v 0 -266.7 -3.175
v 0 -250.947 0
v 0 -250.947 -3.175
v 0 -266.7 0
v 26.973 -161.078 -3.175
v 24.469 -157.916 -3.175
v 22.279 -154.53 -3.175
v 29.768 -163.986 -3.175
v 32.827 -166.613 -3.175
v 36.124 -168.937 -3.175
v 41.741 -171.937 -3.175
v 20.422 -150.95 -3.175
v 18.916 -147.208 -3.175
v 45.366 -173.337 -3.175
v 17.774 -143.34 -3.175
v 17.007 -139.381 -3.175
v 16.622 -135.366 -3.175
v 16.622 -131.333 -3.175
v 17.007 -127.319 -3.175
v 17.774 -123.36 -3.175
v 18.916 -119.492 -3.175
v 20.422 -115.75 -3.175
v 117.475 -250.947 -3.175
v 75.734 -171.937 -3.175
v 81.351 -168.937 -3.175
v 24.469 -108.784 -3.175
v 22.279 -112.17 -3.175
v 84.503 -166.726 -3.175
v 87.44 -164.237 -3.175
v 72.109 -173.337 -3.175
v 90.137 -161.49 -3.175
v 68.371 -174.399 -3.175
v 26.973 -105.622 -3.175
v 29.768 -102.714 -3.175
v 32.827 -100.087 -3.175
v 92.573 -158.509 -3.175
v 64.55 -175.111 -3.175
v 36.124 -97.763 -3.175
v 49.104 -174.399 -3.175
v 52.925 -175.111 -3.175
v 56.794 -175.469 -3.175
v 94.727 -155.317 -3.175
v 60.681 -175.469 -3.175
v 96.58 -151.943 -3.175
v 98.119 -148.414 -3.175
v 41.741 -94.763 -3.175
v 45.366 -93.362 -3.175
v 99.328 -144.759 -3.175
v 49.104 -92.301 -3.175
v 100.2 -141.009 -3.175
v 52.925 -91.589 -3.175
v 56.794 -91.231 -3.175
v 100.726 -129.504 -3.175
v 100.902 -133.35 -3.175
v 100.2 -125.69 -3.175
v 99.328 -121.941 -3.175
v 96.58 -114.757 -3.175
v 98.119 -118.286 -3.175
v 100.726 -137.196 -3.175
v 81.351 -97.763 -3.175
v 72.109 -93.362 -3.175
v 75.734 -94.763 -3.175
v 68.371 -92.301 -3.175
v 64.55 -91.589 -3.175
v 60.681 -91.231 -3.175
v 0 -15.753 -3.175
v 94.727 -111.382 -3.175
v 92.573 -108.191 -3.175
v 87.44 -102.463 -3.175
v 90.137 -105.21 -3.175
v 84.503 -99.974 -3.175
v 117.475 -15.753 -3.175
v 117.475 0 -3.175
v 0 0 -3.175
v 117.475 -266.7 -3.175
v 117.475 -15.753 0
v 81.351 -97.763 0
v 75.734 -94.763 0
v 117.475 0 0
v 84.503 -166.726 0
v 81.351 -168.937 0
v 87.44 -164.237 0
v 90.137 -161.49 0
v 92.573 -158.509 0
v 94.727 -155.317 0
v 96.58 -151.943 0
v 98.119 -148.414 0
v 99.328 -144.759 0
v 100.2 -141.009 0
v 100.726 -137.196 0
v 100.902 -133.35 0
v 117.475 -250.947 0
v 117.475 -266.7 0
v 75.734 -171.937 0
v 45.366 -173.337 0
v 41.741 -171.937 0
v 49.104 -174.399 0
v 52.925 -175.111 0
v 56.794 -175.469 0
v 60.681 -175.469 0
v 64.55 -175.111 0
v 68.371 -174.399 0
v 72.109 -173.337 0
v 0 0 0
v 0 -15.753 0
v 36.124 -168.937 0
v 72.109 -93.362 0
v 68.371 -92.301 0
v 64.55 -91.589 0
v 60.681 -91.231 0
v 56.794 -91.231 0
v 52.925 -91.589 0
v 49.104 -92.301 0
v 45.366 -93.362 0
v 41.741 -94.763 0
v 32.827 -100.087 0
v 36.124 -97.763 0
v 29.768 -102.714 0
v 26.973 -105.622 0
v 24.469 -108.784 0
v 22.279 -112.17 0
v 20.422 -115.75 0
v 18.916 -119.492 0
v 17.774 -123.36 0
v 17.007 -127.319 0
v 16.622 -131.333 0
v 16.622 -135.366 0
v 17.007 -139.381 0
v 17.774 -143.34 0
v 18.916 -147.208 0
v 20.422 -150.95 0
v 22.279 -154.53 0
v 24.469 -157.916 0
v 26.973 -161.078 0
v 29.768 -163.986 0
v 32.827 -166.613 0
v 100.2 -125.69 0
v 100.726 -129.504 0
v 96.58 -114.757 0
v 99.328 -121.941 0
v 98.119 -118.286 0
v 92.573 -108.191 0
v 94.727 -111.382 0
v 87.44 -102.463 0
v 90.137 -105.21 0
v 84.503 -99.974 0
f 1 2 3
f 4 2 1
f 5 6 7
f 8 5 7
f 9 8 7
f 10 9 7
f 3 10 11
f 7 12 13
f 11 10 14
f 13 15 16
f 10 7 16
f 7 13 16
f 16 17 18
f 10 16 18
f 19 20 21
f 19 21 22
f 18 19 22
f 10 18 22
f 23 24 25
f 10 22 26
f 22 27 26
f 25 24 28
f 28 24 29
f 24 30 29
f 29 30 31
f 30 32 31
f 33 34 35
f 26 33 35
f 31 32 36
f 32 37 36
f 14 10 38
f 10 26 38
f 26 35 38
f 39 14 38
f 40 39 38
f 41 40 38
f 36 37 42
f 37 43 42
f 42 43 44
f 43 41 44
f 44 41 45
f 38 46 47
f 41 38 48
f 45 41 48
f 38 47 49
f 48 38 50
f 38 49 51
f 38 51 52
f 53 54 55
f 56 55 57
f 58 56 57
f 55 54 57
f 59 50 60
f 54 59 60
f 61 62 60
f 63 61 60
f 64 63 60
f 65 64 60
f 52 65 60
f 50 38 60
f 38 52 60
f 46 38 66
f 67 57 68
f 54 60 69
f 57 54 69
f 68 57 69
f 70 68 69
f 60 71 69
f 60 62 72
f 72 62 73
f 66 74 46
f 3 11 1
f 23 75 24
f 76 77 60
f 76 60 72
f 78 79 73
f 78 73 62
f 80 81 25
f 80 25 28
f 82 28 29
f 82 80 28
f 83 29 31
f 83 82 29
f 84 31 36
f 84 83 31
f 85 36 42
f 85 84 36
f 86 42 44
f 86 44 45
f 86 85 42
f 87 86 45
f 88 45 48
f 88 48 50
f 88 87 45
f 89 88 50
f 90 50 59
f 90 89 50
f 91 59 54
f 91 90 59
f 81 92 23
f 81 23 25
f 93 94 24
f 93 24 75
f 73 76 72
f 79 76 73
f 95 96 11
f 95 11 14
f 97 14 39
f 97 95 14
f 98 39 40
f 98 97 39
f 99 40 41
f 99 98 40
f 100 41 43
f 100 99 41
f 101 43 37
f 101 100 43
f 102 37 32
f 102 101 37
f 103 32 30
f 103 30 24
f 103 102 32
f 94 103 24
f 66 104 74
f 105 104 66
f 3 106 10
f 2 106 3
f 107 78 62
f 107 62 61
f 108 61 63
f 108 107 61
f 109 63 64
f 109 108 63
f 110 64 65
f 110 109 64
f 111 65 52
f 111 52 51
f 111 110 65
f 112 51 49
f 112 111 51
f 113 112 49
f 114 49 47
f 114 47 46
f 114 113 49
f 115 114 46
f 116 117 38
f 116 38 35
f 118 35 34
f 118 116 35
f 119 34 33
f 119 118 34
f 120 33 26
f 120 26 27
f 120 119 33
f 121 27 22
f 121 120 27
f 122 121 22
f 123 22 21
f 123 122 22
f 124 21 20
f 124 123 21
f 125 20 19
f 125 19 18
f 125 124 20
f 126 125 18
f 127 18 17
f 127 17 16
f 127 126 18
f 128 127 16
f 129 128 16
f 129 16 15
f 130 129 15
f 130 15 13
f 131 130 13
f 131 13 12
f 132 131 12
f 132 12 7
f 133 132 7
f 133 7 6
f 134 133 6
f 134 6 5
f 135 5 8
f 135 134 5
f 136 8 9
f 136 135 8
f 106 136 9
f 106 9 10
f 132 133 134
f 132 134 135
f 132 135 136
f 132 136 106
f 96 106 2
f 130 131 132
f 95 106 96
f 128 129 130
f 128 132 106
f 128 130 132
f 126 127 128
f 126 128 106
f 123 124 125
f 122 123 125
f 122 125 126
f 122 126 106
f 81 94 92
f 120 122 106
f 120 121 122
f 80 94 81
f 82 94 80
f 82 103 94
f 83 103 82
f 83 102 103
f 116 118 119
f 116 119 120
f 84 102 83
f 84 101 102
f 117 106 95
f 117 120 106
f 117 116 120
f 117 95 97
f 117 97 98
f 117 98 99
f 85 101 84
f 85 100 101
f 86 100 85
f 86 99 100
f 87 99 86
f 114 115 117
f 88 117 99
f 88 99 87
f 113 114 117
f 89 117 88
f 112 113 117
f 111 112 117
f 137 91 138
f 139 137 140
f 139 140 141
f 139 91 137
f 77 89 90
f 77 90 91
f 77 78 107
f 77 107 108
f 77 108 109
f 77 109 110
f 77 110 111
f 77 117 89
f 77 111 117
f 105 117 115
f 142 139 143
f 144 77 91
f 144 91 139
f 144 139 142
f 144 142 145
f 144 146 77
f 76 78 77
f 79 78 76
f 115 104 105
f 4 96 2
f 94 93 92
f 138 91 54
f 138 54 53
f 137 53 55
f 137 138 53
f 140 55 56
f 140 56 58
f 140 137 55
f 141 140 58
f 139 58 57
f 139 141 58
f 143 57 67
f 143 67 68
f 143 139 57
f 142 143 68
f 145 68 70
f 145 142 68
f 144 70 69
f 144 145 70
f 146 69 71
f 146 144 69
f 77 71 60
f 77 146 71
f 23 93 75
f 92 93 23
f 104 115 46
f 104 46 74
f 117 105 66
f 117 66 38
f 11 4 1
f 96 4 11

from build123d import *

# Parameters (mm, degrees)
F1_DEPTH = 3.175


with BuildPart() as f1:
    # F0 (on Top) → F1 (new body)
    with BuildSketch(Plane.XY):
        with BuildLine():
            ThreePointArc((81.351365, -168.93669), (95.692172, -153.651573), (100.901516, -133.34994))
            ThreePointArc((100.901516, -133.34994), (95.692172, -113.048307), (81.351365, -97.763191))
            ThreePointArc((81.351365, -97.763191), (78.599393, -96.157081), (75.733991, -94.763378))
            ThreePointArc((75.733991, -94.763378), (58.737516, -91.18594), (41.741042, -94.763378))
            ThreePointArc((41.741042, -94.763378), (38.87564, -96.157081), (36.123668, -97.763191))
            ThreePointArc((36.123668, -97.763191), (16.573516, -133.34994), (36.123668, -168.93669))
            ThreePointArc((36.123668, -168.93669), (38.87564, -170.542799), (41.741042, -171.936502))
            ThreePointArc((41.741042, -171.936502), (58.737516, -175.51394), (75.733991, -171.936502))
            ThreePointArc((75.733991, -171.936502), (78.599393, -170.542799), (81.351365, -168.93669))
        make_face()
        with BuildLine():
            ThreePointArc((75.733991, -94.763378), (78.599393, -96.157081), (81.351365, -97.763191))
            Line((81.351365, -97.763191), (117.475033, -15.752761))
            Line((117.475033, -15.752761), (117.475033, 0))
            Line((117.475033, 0), (75.733991, -94.763378))
        make_face()
        with BuildLine():
            Line((117.475033, -250.947119), (81.351365, -168.93669))
            ThreePointArc((81.351365, -168.93669), (78.599393, -170.542799), (75.733991, -171.936502))
            Line((75.733991, -171.936502), (117.475033, -266.69988))
            Line((117.475033, -266.69988), (117.475033, -250.947119))
        make_face()
        with BuildLine():
            ThreePointArc((36.123668, -97.763191), (38.87564, -96.157081), (41.741042, -94.763378))
            Line((41.741042, -94.763378), (0, 0))
            Line((0, 0), (0, -15.752761))
            Line((0, -15.752761), (36.123668, -97.763191))
        make_face()
        with BuildLine():
            Line((0, -266.69988), (41.741042, -171.936502))
            ThreePointArc((41.741042, -171.936502), (38.87564, -170.542799), (36.123668, -168.93669))
            Line((36.123668, -168.93669), (0, -250.947119))
            Line((0, -250.947119), (0, -266.69988))
        make_face()
    extrude(amount=-F1_DEPTH)


solid = f1.part
